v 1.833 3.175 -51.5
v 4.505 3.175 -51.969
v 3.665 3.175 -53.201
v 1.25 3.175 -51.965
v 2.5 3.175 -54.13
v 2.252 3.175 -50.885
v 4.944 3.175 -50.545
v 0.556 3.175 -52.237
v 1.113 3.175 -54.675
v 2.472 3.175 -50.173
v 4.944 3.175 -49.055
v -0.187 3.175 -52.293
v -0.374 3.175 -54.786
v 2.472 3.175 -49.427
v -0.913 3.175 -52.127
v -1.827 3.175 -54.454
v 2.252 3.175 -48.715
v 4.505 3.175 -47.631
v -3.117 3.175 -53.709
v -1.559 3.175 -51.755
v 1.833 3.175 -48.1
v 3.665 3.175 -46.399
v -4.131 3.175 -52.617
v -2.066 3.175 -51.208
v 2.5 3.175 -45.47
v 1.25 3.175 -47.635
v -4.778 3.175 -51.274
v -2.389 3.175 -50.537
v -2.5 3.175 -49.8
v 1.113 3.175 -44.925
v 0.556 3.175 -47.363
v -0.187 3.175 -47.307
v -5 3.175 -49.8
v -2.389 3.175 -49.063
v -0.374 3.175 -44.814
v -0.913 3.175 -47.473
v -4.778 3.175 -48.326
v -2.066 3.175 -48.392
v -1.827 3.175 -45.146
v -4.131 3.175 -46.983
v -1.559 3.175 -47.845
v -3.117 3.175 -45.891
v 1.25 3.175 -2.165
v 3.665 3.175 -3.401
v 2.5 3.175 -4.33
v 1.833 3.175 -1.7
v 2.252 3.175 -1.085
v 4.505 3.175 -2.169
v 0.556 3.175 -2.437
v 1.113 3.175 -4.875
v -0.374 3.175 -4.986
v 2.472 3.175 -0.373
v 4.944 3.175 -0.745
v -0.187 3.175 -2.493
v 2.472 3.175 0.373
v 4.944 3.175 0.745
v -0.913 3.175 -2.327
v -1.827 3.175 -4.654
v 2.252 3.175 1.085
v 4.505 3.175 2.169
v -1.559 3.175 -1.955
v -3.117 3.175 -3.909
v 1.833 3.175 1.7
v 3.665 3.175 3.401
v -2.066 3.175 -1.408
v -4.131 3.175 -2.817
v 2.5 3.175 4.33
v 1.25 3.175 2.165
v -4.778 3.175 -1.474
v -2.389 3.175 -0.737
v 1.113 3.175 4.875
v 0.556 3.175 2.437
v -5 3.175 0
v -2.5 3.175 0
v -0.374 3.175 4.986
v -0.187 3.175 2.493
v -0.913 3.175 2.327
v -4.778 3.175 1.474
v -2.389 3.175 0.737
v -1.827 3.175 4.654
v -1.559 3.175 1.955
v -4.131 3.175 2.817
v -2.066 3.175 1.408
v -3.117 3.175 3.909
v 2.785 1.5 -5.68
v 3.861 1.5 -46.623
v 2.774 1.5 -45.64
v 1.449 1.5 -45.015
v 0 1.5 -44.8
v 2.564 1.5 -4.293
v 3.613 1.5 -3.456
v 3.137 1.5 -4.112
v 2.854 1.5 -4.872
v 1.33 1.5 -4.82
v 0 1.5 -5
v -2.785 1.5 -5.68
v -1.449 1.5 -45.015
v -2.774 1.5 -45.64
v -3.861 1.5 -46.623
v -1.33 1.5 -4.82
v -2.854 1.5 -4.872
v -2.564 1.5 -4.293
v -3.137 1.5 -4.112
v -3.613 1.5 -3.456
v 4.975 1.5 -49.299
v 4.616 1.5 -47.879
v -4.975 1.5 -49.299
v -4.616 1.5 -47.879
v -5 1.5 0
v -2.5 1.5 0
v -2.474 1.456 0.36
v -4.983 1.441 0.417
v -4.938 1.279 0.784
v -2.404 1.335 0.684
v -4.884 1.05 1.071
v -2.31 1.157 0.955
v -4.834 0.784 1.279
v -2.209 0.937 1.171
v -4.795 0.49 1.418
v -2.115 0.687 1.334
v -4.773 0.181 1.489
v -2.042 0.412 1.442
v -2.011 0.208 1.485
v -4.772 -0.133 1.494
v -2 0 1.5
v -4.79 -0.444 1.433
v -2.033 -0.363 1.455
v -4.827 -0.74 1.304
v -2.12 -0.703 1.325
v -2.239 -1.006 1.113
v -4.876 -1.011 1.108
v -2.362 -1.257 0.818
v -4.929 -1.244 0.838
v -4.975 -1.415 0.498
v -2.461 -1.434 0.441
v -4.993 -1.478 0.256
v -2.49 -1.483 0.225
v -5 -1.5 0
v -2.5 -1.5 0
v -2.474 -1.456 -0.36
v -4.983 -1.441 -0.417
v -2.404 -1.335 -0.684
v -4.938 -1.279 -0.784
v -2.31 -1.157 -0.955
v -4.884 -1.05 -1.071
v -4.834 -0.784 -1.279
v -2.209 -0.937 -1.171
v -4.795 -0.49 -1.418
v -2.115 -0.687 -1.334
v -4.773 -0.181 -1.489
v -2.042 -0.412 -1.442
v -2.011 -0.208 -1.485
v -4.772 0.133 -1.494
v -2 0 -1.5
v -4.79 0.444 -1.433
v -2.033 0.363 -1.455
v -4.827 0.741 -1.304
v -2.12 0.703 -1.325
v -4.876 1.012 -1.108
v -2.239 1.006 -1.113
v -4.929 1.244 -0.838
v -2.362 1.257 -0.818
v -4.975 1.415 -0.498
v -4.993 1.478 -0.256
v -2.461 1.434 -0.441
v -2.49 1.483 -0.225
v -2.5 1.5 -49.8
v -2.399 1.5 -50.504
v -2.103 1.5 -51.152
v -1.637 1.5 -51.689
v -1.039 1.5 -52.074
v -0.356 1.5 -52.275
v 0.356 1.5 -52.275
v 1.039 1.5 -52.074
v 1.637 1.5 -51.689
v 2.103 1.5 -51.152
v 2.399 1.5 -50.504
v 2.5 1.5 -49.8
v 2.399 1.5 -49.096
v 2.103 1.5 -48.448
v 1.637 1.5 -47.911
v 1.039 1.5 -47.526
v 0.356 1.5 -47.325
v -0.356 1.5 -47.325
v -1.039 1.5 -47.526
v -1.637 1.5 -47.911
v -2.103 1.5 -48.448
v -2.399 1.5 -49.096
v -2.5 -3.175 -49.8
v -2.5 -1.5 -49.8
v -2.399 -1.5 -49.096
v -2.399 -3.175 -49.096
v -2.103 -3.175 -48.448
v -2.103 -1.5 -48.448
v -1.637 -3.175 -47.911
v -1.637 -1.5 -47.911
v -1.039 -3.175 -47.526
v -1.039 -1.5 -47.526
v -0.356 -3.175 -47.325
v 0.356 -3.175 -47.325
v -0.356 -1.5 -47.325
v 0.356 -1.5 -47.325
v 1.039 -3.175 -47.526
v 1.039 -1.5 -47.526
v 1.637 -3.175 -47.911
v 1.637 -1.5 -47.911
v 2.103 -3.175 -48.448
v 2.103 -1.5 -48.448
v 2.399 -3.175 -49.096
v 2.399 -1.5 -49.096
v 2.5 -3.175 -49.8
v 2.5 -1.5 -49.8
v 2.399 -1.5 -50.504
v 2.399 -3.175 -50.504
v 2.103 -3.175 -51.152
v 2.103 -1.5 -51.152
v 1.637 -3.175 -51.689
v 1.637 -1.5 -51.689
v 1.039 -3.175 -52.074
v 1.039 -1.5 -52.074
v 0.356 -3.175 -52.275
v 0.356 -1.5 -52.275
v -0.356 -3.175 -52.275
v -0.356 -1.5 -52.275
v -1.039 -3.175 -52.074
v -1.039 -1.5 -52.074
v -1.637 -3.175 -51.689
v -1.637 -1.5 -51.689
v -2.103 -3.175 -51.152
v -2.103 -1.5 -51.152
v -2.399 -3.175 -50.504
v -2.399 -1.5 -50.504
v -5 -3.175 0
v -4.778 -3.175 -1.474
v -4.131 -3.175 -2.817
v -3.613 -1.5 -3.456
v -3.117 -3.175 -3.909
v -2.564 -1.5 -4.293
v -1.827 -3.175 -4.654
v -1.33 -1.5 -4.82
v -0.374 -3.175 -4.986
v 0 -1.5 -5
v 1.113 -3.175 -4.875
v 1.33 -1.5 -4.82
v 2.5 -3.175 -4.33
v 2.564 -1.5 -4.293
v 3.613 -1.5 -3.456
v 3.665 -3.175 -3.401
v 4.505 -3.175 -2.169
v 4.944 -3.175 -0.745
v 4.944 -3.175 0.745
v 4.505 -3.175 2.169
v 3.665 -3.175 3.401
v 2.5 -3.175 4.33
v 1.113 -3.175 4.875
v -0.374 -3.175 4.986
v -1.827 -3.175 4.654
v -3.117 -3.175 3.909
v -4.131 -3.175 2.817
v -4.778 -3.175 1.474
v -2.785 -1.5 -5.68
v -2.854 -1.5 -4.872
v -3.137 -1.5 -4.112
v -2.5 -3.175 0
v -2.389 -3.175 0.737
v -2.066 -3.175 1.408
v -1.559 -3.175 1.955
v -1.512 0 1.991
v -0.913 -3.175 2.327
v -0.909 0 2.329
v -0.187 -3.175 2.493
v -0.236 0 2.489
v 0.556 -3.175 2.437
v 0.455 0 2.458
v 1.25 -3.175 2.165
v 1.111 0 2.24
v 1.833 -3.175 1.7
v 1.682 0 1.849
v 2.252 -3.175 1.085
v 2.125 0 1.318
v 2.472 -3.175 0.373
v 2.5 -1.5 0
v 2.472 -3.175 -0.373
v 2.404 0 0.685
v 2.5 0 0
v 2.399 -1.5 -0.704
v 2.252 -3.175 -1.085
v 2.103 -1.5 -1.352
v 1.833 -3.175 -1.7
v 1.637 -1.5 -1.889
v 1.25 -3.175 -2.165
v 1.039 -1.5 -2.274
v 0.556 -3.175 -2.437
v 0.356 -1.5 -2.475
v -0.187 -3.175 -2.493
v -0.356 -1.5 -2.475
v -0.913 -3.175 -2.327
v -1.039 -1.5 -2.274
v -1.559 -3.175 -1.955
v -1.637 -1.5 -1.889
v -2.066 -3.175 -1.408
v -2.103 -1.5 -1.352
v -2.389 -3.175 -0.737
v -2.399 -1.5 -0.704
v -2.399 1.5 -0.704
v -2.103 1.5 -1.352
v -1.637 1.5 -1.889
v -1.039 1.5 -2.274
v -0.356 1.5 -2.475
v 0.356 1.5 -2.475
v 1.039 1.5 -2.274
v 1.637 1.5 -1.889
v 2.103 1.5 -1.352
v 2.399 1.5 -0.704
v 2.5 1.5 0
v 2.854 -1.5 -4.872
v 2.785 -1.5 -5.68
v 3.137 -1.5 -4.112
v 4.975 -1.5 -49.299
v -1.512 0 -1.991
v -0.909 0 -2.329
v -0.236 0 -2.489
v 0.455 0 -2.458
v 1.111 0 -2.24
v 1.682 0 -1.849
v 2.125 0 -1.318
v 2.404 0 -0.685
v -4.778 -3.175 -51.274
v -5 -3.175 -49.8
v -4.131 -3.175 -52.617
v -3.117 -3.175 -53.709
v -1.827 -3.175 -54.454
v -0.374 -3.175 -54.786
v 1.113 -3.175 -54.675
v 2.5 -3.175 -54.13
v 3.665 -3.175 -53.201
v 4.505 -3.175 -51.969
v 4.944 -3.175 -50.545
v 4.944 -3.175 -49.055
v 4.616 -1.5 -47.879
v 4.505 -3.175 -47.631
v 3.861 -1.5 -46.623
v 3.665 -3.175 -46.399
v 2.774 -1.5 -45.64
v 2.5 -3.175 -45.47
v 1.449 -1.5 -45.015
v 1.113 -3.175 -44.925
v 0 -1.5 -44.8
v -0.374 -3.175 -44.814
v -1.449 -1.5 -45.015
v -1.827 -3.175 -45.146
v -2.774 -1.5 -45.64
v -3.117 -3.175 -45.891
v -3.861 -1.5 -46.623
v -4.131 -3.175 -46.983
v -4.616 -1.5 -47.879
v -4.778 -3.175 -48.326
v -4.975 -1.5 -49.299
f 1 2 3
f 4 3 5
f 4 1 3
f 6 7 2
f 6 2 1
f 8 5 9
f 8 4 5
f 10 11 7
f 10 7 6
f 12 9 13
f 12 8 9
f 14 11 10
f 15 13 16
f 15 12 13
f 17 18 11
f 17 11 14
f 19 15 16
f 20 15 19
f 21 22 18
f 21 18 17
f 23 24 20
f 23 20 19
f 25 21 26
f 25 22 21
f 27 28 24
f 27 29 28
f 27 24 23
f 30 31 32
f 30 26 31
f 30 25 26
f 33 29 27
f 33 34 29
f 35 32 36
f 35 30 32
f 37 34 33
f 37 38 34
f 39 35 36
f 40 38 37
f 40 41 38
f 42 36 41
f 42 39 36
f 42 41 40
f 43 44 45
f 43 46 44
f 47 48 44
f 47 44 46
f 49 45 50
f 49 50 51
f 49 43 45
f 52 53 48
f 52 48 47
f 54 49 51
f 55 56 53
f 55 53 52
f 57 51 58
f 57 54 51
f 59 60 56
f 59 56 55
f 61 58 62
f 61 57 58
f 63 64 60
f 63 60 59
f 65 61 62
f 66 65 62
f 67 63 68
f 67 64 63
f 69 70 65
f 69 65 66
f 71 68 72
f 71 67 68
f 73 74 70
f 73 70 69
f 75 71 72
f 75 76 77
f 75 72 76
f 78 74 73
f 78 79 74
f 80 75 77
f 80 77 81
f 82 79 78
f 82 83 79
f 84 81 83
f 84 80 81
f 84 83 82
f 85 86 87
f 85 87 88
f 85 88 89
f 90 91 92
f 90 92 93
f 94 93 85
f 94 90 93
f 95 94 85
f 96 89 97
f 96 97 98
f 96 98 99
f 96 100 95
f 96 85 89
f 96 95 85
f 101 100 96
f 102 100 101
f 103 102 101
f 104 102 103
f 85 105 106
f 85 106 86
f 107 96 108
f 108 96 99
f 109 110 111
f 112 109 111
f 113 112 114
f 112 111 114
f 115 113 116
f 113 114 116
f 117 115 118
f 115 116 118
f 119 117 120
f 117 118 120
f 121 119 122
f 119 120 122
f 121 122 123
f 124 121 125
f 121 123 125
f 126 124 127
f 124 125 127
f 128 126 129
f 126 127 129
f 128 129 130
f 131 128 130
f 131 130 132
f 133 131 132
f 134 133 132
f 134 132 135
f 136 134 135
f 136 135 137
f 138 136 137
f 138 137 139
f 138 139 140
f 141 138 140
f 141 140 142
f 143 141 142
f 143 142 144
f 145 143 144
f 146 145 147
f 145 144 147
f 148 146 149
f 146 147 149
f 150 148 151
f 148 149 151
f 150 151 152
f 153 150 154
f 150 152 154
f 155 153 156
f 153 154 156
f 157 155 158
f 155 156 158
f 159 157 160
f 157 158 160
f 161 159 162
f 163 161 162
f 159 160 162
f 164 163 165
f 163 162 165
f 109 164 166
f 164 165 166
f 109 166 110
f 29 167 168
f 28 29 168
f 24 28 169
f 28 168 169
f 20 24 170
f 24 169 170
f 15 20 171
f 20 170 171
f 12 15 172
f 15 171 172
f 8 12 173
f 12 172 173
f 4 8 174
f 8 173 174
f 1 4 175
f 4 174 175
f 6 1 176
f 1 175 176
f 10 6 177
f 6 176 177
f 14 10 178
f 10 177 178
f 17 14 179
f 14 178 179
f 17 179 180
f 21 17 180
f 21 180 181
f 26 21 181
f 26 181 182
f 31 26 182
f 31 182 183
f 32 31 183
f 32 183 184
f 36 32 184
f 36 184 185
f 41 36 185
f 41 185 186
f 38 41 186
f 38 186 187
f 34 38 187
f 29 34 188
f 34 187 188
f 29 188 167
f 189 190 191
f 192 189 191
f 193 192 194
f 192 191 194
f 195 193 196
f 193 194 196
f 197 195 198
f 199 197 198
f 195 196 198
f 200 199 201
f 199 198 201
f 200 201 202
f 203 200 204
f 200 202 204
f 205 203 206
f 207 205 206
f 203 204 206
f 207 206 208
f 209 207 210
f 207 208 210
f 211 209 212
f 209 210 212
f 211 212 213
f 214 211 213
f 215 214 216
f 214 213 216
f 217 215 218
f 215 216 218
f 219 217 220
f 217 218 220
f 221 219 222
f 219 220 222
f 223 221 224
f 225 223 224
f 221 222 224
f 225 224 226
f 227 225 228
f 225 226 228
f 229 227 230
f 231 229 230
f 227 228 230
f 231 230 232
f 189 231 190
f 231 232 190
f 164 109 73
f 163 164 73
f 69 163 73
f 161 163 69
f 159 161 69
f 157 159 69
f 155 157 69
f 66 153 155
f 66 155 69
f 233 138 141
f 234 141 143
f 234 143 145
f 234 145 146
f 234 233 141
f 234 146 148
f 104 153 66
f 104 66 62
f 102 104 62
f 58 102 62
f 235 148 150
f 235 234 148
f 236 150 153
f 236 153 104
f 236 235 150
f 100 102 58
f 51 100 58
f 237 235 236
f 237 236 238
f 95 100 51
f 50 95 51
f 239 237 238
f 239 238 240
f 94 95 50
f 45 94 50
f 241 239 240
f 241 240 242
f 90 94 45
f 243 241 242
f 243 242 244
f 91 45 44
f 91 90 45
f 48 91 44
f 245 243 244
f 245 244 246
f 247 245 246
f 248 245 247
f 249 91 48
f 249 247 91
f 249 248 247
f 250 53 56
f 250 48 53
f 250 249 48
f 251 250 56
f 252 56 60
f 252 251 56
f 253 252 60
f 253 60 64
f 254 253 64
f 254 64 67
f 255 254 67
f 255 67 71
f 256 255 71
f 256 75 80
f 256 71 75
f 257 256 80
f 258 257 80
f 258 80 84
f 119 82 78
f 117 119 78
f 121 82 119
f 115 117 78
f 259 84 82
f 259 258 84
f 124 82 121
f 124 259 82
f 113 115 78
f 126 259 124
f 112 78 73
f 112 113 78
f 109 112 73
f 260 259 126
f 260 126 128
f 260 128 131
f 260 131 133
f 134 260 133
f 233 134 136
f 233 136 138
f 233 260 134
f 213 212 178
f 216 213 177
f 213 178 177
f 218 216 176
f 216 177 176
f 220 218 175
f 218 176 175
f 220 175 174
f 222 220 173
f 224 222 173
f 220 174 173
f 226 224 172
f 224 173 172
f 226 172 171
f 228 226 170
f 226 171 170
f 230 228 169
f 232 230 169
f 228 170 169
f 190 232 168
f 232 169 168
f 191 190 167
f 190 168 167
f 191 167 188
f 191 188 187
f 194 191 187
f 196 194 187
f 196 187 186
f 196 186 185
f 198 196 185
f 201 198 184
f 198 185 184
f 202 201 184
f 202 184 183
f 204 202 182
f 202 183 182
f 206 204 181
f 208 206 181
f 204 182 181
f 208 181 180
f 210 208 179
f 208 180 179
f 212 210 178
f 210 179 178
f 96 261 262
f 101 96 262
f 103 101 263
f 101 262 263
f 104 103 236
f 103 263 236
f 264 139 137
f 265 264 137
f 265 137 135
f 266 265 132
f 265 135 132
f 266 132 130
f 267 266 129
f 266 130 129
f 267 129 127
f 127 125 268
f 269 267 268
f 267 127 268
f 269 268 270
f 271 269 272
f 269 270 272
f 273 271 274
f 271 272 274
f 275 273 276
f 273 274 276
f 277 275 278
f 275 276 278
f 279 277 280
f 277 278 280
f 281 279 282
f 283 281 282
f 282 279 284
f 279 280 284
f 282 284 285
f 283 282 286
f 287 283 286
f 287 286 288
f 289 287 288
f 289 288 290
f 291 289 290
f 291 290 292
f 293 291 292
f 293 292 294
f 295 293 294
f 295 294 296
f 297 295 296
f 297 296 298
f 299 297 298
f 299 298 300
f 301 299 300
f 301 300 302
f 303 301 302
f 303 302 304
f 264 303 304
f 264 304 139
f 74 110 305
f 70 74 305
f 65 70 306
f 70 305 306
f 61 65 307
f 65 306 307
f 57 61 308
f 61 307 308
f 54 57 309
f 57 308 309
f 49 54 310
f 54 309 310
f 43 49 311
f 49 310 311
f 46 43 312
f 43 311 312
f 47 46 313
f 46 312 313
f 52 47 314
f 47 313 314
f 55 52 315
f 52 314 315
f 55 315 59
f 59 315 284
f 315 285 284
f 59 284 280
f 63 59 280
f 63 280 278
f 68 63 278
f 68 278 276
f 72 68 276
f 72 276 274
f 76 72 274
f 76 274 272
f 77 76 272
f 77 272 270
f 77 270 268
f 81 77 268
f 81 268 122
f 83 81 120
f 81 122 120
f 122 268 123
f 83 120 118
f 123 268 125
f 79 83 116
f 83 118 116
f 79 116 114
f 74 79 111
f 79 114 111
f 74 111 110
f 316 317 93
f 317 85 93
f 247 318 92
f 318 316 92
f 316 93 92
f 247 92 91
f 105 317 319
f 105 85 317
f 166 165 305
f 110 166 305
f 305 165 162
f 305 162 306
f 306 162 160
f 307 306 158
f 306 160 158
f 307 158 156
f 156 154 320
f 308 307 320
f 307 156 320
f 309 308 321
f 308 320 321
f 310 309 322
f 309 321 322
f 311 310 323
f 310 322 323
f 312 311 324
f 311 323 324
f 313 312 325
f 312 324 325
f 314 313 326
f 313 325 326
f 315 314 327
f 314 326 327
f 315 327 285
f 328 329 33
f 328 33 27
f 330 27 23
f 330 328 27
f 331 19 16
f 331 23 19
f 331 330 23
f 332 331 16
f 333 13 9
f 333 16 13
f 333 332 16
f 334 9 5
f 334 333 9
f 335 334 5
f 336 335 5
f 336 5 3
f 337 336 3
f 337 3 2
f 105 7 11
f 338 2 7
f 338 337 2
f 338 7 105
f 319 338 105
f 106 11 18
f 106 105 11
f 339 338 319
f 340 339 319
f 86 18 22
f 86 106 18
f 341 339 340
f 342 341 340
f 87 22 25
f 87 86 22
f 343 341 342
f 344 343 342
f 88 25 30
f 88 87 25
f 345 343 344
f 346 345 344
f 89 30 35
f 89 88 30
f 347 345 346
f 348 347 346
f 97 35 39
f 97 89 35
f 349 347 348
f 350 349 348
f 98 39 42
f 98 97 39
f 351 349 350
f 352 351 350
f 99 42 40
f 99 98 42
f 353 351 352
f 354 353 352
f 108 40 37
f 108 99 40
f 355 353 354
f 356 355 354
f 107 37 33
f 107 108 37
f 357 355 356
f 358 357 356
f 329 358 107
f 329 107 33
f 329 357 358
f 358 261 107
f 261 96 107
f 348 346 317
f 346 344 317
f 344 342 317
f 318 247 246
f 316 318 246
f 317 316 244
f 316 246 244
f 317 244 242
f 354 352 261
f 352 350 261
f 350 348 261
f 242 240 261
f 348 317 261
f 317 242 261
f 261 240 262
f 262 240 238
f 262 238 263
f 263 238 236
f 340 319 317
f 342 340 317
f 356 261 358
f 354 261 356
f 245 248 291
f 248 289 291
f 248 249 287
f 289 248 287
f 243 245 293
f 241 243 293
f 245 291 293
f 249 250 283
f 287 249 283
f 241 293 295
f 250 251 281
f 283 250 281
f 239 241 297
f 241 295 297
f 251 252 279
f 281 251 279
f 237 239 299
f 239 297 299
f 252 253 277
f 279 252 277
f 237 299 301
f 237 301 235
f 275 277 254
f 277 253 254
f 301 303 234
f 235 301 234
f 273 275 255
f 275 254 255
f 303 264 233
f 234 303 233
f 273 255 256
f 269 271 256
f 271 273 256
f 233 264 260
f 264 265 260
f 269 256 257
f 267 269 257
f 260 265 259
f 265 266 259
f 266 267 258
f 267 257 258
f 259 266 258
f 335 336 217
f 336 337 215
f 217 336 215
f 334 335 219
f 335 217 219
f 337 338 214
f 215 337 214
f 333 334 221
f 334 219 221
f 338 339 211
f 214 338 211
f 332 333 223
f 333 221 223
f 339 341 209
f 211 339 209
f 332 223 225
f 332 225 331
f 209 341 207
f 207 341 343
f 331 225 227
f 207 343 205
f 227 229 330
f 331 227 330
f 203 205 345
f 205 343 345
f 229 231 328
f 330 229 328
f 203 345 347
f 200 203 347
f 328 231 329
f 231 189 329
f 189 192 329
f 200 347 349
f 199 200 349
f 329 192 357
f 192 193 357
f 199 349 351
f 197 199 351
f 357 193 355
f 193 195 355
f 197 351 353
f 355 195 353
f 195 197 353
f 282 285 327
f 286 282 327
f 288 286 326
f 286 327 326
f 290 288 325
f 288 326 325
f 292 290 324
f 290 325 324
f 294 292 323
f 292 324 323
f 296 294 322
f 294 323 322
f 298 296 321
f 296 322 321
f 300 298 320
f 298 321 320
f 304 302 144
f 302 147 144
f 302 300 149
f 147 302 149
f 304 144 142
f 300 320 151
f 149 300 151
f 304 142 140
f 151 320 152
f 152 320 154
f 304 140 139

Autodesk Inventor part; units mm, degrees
ref_plane "YZ Plane" through (0, 0, 0) normal (1, 0, 0) x (0, 1, 0)
ref_plane "XY Plane" through (0, 0, 0) normal (0, 0, 1) x (1, 0, 0)
sketch "Sketch1" plane through (0, 0, 0) normal (0, 1, 0) x (-1, 0, 0)
  circle A0 centre (0, 0) radius 5
  circle A1 centre (0, 0) radius 2.5
  dimension "d0" = 10
  dimension "d1" = 5
extrude "Extrusion1" add sketch "Sketch1" along normal mid plane 6.35
sketch "Sketch2" plane through (0, 0, 0) normal (0, 1, 0) x (-1, 0, 0)
  circle A0 centre (0, 0) radius 2.5 construction
  line L0 (0, 0) -> (0, -49.8) construction
  circle A1 centre (0, -49.8) radius 5
  circle A2 centre (0, -49.8) radius 2.5
  dimension "d4" = 49.8
  dimension "d5" = 10
extrude "Extrusion2" add sketch "Sketch2" along normal mid plane 6.35
sketch "Sketch3" plane through (0, 0, 0) normal (1, 0, 0) x (0, 1, 0)
  point P0 (0, 0)
ref_plane "Work Plane1" through (0, 1.5, 0) normal (0, 1, 0) x (-1, 0, 0)
sketch "Sketch4" plane through (0, 1.5, 0) normal (0, 1, 0) x (-1, 0, 0)
  circle A0 centre (0, 0) radius 2.5 projected
  line L0 (-2.5, 0) -> (-5, -49.8)
  circle A1 centre (0, -49.8) radius 5 projected
  line L1 (2.5, 0) -> (5, -49.8)
extrude "Extrusion3" add sketch "Sketch4" against normal blind 3 contours L1 A1 L0 A0 | L1 A1 L0
sketch "Sketch5" plane through (0, 1.5, -49.8) normal (0, 1, 0) x (1, 0, 0)
  circle A0 centre (0, 0) radius 2.5
  point P0 (0, -49.8)
extrude "Extrusion4" cut sketch "Sketch5" against normal through all
fillet "Fillet1" radius 3 4 edges at (2.7109, 0.75, -4.2013) (2.7109, -0.75, -4.2013) (-2.7109, 0.75, -4.2013) (-2.7109, -0.75, -4.2013)
sketch "Sketch6" plane through (0, 0, 0) normal (1, 0, 0) x (0, 1, 0)
  circle A0 centre (0, 0) radius 1.5
  dimension "d15" = 3
extrude "Extrusion5" cut sketch "Sketch6" against normal through all
properties part number "Biella"
